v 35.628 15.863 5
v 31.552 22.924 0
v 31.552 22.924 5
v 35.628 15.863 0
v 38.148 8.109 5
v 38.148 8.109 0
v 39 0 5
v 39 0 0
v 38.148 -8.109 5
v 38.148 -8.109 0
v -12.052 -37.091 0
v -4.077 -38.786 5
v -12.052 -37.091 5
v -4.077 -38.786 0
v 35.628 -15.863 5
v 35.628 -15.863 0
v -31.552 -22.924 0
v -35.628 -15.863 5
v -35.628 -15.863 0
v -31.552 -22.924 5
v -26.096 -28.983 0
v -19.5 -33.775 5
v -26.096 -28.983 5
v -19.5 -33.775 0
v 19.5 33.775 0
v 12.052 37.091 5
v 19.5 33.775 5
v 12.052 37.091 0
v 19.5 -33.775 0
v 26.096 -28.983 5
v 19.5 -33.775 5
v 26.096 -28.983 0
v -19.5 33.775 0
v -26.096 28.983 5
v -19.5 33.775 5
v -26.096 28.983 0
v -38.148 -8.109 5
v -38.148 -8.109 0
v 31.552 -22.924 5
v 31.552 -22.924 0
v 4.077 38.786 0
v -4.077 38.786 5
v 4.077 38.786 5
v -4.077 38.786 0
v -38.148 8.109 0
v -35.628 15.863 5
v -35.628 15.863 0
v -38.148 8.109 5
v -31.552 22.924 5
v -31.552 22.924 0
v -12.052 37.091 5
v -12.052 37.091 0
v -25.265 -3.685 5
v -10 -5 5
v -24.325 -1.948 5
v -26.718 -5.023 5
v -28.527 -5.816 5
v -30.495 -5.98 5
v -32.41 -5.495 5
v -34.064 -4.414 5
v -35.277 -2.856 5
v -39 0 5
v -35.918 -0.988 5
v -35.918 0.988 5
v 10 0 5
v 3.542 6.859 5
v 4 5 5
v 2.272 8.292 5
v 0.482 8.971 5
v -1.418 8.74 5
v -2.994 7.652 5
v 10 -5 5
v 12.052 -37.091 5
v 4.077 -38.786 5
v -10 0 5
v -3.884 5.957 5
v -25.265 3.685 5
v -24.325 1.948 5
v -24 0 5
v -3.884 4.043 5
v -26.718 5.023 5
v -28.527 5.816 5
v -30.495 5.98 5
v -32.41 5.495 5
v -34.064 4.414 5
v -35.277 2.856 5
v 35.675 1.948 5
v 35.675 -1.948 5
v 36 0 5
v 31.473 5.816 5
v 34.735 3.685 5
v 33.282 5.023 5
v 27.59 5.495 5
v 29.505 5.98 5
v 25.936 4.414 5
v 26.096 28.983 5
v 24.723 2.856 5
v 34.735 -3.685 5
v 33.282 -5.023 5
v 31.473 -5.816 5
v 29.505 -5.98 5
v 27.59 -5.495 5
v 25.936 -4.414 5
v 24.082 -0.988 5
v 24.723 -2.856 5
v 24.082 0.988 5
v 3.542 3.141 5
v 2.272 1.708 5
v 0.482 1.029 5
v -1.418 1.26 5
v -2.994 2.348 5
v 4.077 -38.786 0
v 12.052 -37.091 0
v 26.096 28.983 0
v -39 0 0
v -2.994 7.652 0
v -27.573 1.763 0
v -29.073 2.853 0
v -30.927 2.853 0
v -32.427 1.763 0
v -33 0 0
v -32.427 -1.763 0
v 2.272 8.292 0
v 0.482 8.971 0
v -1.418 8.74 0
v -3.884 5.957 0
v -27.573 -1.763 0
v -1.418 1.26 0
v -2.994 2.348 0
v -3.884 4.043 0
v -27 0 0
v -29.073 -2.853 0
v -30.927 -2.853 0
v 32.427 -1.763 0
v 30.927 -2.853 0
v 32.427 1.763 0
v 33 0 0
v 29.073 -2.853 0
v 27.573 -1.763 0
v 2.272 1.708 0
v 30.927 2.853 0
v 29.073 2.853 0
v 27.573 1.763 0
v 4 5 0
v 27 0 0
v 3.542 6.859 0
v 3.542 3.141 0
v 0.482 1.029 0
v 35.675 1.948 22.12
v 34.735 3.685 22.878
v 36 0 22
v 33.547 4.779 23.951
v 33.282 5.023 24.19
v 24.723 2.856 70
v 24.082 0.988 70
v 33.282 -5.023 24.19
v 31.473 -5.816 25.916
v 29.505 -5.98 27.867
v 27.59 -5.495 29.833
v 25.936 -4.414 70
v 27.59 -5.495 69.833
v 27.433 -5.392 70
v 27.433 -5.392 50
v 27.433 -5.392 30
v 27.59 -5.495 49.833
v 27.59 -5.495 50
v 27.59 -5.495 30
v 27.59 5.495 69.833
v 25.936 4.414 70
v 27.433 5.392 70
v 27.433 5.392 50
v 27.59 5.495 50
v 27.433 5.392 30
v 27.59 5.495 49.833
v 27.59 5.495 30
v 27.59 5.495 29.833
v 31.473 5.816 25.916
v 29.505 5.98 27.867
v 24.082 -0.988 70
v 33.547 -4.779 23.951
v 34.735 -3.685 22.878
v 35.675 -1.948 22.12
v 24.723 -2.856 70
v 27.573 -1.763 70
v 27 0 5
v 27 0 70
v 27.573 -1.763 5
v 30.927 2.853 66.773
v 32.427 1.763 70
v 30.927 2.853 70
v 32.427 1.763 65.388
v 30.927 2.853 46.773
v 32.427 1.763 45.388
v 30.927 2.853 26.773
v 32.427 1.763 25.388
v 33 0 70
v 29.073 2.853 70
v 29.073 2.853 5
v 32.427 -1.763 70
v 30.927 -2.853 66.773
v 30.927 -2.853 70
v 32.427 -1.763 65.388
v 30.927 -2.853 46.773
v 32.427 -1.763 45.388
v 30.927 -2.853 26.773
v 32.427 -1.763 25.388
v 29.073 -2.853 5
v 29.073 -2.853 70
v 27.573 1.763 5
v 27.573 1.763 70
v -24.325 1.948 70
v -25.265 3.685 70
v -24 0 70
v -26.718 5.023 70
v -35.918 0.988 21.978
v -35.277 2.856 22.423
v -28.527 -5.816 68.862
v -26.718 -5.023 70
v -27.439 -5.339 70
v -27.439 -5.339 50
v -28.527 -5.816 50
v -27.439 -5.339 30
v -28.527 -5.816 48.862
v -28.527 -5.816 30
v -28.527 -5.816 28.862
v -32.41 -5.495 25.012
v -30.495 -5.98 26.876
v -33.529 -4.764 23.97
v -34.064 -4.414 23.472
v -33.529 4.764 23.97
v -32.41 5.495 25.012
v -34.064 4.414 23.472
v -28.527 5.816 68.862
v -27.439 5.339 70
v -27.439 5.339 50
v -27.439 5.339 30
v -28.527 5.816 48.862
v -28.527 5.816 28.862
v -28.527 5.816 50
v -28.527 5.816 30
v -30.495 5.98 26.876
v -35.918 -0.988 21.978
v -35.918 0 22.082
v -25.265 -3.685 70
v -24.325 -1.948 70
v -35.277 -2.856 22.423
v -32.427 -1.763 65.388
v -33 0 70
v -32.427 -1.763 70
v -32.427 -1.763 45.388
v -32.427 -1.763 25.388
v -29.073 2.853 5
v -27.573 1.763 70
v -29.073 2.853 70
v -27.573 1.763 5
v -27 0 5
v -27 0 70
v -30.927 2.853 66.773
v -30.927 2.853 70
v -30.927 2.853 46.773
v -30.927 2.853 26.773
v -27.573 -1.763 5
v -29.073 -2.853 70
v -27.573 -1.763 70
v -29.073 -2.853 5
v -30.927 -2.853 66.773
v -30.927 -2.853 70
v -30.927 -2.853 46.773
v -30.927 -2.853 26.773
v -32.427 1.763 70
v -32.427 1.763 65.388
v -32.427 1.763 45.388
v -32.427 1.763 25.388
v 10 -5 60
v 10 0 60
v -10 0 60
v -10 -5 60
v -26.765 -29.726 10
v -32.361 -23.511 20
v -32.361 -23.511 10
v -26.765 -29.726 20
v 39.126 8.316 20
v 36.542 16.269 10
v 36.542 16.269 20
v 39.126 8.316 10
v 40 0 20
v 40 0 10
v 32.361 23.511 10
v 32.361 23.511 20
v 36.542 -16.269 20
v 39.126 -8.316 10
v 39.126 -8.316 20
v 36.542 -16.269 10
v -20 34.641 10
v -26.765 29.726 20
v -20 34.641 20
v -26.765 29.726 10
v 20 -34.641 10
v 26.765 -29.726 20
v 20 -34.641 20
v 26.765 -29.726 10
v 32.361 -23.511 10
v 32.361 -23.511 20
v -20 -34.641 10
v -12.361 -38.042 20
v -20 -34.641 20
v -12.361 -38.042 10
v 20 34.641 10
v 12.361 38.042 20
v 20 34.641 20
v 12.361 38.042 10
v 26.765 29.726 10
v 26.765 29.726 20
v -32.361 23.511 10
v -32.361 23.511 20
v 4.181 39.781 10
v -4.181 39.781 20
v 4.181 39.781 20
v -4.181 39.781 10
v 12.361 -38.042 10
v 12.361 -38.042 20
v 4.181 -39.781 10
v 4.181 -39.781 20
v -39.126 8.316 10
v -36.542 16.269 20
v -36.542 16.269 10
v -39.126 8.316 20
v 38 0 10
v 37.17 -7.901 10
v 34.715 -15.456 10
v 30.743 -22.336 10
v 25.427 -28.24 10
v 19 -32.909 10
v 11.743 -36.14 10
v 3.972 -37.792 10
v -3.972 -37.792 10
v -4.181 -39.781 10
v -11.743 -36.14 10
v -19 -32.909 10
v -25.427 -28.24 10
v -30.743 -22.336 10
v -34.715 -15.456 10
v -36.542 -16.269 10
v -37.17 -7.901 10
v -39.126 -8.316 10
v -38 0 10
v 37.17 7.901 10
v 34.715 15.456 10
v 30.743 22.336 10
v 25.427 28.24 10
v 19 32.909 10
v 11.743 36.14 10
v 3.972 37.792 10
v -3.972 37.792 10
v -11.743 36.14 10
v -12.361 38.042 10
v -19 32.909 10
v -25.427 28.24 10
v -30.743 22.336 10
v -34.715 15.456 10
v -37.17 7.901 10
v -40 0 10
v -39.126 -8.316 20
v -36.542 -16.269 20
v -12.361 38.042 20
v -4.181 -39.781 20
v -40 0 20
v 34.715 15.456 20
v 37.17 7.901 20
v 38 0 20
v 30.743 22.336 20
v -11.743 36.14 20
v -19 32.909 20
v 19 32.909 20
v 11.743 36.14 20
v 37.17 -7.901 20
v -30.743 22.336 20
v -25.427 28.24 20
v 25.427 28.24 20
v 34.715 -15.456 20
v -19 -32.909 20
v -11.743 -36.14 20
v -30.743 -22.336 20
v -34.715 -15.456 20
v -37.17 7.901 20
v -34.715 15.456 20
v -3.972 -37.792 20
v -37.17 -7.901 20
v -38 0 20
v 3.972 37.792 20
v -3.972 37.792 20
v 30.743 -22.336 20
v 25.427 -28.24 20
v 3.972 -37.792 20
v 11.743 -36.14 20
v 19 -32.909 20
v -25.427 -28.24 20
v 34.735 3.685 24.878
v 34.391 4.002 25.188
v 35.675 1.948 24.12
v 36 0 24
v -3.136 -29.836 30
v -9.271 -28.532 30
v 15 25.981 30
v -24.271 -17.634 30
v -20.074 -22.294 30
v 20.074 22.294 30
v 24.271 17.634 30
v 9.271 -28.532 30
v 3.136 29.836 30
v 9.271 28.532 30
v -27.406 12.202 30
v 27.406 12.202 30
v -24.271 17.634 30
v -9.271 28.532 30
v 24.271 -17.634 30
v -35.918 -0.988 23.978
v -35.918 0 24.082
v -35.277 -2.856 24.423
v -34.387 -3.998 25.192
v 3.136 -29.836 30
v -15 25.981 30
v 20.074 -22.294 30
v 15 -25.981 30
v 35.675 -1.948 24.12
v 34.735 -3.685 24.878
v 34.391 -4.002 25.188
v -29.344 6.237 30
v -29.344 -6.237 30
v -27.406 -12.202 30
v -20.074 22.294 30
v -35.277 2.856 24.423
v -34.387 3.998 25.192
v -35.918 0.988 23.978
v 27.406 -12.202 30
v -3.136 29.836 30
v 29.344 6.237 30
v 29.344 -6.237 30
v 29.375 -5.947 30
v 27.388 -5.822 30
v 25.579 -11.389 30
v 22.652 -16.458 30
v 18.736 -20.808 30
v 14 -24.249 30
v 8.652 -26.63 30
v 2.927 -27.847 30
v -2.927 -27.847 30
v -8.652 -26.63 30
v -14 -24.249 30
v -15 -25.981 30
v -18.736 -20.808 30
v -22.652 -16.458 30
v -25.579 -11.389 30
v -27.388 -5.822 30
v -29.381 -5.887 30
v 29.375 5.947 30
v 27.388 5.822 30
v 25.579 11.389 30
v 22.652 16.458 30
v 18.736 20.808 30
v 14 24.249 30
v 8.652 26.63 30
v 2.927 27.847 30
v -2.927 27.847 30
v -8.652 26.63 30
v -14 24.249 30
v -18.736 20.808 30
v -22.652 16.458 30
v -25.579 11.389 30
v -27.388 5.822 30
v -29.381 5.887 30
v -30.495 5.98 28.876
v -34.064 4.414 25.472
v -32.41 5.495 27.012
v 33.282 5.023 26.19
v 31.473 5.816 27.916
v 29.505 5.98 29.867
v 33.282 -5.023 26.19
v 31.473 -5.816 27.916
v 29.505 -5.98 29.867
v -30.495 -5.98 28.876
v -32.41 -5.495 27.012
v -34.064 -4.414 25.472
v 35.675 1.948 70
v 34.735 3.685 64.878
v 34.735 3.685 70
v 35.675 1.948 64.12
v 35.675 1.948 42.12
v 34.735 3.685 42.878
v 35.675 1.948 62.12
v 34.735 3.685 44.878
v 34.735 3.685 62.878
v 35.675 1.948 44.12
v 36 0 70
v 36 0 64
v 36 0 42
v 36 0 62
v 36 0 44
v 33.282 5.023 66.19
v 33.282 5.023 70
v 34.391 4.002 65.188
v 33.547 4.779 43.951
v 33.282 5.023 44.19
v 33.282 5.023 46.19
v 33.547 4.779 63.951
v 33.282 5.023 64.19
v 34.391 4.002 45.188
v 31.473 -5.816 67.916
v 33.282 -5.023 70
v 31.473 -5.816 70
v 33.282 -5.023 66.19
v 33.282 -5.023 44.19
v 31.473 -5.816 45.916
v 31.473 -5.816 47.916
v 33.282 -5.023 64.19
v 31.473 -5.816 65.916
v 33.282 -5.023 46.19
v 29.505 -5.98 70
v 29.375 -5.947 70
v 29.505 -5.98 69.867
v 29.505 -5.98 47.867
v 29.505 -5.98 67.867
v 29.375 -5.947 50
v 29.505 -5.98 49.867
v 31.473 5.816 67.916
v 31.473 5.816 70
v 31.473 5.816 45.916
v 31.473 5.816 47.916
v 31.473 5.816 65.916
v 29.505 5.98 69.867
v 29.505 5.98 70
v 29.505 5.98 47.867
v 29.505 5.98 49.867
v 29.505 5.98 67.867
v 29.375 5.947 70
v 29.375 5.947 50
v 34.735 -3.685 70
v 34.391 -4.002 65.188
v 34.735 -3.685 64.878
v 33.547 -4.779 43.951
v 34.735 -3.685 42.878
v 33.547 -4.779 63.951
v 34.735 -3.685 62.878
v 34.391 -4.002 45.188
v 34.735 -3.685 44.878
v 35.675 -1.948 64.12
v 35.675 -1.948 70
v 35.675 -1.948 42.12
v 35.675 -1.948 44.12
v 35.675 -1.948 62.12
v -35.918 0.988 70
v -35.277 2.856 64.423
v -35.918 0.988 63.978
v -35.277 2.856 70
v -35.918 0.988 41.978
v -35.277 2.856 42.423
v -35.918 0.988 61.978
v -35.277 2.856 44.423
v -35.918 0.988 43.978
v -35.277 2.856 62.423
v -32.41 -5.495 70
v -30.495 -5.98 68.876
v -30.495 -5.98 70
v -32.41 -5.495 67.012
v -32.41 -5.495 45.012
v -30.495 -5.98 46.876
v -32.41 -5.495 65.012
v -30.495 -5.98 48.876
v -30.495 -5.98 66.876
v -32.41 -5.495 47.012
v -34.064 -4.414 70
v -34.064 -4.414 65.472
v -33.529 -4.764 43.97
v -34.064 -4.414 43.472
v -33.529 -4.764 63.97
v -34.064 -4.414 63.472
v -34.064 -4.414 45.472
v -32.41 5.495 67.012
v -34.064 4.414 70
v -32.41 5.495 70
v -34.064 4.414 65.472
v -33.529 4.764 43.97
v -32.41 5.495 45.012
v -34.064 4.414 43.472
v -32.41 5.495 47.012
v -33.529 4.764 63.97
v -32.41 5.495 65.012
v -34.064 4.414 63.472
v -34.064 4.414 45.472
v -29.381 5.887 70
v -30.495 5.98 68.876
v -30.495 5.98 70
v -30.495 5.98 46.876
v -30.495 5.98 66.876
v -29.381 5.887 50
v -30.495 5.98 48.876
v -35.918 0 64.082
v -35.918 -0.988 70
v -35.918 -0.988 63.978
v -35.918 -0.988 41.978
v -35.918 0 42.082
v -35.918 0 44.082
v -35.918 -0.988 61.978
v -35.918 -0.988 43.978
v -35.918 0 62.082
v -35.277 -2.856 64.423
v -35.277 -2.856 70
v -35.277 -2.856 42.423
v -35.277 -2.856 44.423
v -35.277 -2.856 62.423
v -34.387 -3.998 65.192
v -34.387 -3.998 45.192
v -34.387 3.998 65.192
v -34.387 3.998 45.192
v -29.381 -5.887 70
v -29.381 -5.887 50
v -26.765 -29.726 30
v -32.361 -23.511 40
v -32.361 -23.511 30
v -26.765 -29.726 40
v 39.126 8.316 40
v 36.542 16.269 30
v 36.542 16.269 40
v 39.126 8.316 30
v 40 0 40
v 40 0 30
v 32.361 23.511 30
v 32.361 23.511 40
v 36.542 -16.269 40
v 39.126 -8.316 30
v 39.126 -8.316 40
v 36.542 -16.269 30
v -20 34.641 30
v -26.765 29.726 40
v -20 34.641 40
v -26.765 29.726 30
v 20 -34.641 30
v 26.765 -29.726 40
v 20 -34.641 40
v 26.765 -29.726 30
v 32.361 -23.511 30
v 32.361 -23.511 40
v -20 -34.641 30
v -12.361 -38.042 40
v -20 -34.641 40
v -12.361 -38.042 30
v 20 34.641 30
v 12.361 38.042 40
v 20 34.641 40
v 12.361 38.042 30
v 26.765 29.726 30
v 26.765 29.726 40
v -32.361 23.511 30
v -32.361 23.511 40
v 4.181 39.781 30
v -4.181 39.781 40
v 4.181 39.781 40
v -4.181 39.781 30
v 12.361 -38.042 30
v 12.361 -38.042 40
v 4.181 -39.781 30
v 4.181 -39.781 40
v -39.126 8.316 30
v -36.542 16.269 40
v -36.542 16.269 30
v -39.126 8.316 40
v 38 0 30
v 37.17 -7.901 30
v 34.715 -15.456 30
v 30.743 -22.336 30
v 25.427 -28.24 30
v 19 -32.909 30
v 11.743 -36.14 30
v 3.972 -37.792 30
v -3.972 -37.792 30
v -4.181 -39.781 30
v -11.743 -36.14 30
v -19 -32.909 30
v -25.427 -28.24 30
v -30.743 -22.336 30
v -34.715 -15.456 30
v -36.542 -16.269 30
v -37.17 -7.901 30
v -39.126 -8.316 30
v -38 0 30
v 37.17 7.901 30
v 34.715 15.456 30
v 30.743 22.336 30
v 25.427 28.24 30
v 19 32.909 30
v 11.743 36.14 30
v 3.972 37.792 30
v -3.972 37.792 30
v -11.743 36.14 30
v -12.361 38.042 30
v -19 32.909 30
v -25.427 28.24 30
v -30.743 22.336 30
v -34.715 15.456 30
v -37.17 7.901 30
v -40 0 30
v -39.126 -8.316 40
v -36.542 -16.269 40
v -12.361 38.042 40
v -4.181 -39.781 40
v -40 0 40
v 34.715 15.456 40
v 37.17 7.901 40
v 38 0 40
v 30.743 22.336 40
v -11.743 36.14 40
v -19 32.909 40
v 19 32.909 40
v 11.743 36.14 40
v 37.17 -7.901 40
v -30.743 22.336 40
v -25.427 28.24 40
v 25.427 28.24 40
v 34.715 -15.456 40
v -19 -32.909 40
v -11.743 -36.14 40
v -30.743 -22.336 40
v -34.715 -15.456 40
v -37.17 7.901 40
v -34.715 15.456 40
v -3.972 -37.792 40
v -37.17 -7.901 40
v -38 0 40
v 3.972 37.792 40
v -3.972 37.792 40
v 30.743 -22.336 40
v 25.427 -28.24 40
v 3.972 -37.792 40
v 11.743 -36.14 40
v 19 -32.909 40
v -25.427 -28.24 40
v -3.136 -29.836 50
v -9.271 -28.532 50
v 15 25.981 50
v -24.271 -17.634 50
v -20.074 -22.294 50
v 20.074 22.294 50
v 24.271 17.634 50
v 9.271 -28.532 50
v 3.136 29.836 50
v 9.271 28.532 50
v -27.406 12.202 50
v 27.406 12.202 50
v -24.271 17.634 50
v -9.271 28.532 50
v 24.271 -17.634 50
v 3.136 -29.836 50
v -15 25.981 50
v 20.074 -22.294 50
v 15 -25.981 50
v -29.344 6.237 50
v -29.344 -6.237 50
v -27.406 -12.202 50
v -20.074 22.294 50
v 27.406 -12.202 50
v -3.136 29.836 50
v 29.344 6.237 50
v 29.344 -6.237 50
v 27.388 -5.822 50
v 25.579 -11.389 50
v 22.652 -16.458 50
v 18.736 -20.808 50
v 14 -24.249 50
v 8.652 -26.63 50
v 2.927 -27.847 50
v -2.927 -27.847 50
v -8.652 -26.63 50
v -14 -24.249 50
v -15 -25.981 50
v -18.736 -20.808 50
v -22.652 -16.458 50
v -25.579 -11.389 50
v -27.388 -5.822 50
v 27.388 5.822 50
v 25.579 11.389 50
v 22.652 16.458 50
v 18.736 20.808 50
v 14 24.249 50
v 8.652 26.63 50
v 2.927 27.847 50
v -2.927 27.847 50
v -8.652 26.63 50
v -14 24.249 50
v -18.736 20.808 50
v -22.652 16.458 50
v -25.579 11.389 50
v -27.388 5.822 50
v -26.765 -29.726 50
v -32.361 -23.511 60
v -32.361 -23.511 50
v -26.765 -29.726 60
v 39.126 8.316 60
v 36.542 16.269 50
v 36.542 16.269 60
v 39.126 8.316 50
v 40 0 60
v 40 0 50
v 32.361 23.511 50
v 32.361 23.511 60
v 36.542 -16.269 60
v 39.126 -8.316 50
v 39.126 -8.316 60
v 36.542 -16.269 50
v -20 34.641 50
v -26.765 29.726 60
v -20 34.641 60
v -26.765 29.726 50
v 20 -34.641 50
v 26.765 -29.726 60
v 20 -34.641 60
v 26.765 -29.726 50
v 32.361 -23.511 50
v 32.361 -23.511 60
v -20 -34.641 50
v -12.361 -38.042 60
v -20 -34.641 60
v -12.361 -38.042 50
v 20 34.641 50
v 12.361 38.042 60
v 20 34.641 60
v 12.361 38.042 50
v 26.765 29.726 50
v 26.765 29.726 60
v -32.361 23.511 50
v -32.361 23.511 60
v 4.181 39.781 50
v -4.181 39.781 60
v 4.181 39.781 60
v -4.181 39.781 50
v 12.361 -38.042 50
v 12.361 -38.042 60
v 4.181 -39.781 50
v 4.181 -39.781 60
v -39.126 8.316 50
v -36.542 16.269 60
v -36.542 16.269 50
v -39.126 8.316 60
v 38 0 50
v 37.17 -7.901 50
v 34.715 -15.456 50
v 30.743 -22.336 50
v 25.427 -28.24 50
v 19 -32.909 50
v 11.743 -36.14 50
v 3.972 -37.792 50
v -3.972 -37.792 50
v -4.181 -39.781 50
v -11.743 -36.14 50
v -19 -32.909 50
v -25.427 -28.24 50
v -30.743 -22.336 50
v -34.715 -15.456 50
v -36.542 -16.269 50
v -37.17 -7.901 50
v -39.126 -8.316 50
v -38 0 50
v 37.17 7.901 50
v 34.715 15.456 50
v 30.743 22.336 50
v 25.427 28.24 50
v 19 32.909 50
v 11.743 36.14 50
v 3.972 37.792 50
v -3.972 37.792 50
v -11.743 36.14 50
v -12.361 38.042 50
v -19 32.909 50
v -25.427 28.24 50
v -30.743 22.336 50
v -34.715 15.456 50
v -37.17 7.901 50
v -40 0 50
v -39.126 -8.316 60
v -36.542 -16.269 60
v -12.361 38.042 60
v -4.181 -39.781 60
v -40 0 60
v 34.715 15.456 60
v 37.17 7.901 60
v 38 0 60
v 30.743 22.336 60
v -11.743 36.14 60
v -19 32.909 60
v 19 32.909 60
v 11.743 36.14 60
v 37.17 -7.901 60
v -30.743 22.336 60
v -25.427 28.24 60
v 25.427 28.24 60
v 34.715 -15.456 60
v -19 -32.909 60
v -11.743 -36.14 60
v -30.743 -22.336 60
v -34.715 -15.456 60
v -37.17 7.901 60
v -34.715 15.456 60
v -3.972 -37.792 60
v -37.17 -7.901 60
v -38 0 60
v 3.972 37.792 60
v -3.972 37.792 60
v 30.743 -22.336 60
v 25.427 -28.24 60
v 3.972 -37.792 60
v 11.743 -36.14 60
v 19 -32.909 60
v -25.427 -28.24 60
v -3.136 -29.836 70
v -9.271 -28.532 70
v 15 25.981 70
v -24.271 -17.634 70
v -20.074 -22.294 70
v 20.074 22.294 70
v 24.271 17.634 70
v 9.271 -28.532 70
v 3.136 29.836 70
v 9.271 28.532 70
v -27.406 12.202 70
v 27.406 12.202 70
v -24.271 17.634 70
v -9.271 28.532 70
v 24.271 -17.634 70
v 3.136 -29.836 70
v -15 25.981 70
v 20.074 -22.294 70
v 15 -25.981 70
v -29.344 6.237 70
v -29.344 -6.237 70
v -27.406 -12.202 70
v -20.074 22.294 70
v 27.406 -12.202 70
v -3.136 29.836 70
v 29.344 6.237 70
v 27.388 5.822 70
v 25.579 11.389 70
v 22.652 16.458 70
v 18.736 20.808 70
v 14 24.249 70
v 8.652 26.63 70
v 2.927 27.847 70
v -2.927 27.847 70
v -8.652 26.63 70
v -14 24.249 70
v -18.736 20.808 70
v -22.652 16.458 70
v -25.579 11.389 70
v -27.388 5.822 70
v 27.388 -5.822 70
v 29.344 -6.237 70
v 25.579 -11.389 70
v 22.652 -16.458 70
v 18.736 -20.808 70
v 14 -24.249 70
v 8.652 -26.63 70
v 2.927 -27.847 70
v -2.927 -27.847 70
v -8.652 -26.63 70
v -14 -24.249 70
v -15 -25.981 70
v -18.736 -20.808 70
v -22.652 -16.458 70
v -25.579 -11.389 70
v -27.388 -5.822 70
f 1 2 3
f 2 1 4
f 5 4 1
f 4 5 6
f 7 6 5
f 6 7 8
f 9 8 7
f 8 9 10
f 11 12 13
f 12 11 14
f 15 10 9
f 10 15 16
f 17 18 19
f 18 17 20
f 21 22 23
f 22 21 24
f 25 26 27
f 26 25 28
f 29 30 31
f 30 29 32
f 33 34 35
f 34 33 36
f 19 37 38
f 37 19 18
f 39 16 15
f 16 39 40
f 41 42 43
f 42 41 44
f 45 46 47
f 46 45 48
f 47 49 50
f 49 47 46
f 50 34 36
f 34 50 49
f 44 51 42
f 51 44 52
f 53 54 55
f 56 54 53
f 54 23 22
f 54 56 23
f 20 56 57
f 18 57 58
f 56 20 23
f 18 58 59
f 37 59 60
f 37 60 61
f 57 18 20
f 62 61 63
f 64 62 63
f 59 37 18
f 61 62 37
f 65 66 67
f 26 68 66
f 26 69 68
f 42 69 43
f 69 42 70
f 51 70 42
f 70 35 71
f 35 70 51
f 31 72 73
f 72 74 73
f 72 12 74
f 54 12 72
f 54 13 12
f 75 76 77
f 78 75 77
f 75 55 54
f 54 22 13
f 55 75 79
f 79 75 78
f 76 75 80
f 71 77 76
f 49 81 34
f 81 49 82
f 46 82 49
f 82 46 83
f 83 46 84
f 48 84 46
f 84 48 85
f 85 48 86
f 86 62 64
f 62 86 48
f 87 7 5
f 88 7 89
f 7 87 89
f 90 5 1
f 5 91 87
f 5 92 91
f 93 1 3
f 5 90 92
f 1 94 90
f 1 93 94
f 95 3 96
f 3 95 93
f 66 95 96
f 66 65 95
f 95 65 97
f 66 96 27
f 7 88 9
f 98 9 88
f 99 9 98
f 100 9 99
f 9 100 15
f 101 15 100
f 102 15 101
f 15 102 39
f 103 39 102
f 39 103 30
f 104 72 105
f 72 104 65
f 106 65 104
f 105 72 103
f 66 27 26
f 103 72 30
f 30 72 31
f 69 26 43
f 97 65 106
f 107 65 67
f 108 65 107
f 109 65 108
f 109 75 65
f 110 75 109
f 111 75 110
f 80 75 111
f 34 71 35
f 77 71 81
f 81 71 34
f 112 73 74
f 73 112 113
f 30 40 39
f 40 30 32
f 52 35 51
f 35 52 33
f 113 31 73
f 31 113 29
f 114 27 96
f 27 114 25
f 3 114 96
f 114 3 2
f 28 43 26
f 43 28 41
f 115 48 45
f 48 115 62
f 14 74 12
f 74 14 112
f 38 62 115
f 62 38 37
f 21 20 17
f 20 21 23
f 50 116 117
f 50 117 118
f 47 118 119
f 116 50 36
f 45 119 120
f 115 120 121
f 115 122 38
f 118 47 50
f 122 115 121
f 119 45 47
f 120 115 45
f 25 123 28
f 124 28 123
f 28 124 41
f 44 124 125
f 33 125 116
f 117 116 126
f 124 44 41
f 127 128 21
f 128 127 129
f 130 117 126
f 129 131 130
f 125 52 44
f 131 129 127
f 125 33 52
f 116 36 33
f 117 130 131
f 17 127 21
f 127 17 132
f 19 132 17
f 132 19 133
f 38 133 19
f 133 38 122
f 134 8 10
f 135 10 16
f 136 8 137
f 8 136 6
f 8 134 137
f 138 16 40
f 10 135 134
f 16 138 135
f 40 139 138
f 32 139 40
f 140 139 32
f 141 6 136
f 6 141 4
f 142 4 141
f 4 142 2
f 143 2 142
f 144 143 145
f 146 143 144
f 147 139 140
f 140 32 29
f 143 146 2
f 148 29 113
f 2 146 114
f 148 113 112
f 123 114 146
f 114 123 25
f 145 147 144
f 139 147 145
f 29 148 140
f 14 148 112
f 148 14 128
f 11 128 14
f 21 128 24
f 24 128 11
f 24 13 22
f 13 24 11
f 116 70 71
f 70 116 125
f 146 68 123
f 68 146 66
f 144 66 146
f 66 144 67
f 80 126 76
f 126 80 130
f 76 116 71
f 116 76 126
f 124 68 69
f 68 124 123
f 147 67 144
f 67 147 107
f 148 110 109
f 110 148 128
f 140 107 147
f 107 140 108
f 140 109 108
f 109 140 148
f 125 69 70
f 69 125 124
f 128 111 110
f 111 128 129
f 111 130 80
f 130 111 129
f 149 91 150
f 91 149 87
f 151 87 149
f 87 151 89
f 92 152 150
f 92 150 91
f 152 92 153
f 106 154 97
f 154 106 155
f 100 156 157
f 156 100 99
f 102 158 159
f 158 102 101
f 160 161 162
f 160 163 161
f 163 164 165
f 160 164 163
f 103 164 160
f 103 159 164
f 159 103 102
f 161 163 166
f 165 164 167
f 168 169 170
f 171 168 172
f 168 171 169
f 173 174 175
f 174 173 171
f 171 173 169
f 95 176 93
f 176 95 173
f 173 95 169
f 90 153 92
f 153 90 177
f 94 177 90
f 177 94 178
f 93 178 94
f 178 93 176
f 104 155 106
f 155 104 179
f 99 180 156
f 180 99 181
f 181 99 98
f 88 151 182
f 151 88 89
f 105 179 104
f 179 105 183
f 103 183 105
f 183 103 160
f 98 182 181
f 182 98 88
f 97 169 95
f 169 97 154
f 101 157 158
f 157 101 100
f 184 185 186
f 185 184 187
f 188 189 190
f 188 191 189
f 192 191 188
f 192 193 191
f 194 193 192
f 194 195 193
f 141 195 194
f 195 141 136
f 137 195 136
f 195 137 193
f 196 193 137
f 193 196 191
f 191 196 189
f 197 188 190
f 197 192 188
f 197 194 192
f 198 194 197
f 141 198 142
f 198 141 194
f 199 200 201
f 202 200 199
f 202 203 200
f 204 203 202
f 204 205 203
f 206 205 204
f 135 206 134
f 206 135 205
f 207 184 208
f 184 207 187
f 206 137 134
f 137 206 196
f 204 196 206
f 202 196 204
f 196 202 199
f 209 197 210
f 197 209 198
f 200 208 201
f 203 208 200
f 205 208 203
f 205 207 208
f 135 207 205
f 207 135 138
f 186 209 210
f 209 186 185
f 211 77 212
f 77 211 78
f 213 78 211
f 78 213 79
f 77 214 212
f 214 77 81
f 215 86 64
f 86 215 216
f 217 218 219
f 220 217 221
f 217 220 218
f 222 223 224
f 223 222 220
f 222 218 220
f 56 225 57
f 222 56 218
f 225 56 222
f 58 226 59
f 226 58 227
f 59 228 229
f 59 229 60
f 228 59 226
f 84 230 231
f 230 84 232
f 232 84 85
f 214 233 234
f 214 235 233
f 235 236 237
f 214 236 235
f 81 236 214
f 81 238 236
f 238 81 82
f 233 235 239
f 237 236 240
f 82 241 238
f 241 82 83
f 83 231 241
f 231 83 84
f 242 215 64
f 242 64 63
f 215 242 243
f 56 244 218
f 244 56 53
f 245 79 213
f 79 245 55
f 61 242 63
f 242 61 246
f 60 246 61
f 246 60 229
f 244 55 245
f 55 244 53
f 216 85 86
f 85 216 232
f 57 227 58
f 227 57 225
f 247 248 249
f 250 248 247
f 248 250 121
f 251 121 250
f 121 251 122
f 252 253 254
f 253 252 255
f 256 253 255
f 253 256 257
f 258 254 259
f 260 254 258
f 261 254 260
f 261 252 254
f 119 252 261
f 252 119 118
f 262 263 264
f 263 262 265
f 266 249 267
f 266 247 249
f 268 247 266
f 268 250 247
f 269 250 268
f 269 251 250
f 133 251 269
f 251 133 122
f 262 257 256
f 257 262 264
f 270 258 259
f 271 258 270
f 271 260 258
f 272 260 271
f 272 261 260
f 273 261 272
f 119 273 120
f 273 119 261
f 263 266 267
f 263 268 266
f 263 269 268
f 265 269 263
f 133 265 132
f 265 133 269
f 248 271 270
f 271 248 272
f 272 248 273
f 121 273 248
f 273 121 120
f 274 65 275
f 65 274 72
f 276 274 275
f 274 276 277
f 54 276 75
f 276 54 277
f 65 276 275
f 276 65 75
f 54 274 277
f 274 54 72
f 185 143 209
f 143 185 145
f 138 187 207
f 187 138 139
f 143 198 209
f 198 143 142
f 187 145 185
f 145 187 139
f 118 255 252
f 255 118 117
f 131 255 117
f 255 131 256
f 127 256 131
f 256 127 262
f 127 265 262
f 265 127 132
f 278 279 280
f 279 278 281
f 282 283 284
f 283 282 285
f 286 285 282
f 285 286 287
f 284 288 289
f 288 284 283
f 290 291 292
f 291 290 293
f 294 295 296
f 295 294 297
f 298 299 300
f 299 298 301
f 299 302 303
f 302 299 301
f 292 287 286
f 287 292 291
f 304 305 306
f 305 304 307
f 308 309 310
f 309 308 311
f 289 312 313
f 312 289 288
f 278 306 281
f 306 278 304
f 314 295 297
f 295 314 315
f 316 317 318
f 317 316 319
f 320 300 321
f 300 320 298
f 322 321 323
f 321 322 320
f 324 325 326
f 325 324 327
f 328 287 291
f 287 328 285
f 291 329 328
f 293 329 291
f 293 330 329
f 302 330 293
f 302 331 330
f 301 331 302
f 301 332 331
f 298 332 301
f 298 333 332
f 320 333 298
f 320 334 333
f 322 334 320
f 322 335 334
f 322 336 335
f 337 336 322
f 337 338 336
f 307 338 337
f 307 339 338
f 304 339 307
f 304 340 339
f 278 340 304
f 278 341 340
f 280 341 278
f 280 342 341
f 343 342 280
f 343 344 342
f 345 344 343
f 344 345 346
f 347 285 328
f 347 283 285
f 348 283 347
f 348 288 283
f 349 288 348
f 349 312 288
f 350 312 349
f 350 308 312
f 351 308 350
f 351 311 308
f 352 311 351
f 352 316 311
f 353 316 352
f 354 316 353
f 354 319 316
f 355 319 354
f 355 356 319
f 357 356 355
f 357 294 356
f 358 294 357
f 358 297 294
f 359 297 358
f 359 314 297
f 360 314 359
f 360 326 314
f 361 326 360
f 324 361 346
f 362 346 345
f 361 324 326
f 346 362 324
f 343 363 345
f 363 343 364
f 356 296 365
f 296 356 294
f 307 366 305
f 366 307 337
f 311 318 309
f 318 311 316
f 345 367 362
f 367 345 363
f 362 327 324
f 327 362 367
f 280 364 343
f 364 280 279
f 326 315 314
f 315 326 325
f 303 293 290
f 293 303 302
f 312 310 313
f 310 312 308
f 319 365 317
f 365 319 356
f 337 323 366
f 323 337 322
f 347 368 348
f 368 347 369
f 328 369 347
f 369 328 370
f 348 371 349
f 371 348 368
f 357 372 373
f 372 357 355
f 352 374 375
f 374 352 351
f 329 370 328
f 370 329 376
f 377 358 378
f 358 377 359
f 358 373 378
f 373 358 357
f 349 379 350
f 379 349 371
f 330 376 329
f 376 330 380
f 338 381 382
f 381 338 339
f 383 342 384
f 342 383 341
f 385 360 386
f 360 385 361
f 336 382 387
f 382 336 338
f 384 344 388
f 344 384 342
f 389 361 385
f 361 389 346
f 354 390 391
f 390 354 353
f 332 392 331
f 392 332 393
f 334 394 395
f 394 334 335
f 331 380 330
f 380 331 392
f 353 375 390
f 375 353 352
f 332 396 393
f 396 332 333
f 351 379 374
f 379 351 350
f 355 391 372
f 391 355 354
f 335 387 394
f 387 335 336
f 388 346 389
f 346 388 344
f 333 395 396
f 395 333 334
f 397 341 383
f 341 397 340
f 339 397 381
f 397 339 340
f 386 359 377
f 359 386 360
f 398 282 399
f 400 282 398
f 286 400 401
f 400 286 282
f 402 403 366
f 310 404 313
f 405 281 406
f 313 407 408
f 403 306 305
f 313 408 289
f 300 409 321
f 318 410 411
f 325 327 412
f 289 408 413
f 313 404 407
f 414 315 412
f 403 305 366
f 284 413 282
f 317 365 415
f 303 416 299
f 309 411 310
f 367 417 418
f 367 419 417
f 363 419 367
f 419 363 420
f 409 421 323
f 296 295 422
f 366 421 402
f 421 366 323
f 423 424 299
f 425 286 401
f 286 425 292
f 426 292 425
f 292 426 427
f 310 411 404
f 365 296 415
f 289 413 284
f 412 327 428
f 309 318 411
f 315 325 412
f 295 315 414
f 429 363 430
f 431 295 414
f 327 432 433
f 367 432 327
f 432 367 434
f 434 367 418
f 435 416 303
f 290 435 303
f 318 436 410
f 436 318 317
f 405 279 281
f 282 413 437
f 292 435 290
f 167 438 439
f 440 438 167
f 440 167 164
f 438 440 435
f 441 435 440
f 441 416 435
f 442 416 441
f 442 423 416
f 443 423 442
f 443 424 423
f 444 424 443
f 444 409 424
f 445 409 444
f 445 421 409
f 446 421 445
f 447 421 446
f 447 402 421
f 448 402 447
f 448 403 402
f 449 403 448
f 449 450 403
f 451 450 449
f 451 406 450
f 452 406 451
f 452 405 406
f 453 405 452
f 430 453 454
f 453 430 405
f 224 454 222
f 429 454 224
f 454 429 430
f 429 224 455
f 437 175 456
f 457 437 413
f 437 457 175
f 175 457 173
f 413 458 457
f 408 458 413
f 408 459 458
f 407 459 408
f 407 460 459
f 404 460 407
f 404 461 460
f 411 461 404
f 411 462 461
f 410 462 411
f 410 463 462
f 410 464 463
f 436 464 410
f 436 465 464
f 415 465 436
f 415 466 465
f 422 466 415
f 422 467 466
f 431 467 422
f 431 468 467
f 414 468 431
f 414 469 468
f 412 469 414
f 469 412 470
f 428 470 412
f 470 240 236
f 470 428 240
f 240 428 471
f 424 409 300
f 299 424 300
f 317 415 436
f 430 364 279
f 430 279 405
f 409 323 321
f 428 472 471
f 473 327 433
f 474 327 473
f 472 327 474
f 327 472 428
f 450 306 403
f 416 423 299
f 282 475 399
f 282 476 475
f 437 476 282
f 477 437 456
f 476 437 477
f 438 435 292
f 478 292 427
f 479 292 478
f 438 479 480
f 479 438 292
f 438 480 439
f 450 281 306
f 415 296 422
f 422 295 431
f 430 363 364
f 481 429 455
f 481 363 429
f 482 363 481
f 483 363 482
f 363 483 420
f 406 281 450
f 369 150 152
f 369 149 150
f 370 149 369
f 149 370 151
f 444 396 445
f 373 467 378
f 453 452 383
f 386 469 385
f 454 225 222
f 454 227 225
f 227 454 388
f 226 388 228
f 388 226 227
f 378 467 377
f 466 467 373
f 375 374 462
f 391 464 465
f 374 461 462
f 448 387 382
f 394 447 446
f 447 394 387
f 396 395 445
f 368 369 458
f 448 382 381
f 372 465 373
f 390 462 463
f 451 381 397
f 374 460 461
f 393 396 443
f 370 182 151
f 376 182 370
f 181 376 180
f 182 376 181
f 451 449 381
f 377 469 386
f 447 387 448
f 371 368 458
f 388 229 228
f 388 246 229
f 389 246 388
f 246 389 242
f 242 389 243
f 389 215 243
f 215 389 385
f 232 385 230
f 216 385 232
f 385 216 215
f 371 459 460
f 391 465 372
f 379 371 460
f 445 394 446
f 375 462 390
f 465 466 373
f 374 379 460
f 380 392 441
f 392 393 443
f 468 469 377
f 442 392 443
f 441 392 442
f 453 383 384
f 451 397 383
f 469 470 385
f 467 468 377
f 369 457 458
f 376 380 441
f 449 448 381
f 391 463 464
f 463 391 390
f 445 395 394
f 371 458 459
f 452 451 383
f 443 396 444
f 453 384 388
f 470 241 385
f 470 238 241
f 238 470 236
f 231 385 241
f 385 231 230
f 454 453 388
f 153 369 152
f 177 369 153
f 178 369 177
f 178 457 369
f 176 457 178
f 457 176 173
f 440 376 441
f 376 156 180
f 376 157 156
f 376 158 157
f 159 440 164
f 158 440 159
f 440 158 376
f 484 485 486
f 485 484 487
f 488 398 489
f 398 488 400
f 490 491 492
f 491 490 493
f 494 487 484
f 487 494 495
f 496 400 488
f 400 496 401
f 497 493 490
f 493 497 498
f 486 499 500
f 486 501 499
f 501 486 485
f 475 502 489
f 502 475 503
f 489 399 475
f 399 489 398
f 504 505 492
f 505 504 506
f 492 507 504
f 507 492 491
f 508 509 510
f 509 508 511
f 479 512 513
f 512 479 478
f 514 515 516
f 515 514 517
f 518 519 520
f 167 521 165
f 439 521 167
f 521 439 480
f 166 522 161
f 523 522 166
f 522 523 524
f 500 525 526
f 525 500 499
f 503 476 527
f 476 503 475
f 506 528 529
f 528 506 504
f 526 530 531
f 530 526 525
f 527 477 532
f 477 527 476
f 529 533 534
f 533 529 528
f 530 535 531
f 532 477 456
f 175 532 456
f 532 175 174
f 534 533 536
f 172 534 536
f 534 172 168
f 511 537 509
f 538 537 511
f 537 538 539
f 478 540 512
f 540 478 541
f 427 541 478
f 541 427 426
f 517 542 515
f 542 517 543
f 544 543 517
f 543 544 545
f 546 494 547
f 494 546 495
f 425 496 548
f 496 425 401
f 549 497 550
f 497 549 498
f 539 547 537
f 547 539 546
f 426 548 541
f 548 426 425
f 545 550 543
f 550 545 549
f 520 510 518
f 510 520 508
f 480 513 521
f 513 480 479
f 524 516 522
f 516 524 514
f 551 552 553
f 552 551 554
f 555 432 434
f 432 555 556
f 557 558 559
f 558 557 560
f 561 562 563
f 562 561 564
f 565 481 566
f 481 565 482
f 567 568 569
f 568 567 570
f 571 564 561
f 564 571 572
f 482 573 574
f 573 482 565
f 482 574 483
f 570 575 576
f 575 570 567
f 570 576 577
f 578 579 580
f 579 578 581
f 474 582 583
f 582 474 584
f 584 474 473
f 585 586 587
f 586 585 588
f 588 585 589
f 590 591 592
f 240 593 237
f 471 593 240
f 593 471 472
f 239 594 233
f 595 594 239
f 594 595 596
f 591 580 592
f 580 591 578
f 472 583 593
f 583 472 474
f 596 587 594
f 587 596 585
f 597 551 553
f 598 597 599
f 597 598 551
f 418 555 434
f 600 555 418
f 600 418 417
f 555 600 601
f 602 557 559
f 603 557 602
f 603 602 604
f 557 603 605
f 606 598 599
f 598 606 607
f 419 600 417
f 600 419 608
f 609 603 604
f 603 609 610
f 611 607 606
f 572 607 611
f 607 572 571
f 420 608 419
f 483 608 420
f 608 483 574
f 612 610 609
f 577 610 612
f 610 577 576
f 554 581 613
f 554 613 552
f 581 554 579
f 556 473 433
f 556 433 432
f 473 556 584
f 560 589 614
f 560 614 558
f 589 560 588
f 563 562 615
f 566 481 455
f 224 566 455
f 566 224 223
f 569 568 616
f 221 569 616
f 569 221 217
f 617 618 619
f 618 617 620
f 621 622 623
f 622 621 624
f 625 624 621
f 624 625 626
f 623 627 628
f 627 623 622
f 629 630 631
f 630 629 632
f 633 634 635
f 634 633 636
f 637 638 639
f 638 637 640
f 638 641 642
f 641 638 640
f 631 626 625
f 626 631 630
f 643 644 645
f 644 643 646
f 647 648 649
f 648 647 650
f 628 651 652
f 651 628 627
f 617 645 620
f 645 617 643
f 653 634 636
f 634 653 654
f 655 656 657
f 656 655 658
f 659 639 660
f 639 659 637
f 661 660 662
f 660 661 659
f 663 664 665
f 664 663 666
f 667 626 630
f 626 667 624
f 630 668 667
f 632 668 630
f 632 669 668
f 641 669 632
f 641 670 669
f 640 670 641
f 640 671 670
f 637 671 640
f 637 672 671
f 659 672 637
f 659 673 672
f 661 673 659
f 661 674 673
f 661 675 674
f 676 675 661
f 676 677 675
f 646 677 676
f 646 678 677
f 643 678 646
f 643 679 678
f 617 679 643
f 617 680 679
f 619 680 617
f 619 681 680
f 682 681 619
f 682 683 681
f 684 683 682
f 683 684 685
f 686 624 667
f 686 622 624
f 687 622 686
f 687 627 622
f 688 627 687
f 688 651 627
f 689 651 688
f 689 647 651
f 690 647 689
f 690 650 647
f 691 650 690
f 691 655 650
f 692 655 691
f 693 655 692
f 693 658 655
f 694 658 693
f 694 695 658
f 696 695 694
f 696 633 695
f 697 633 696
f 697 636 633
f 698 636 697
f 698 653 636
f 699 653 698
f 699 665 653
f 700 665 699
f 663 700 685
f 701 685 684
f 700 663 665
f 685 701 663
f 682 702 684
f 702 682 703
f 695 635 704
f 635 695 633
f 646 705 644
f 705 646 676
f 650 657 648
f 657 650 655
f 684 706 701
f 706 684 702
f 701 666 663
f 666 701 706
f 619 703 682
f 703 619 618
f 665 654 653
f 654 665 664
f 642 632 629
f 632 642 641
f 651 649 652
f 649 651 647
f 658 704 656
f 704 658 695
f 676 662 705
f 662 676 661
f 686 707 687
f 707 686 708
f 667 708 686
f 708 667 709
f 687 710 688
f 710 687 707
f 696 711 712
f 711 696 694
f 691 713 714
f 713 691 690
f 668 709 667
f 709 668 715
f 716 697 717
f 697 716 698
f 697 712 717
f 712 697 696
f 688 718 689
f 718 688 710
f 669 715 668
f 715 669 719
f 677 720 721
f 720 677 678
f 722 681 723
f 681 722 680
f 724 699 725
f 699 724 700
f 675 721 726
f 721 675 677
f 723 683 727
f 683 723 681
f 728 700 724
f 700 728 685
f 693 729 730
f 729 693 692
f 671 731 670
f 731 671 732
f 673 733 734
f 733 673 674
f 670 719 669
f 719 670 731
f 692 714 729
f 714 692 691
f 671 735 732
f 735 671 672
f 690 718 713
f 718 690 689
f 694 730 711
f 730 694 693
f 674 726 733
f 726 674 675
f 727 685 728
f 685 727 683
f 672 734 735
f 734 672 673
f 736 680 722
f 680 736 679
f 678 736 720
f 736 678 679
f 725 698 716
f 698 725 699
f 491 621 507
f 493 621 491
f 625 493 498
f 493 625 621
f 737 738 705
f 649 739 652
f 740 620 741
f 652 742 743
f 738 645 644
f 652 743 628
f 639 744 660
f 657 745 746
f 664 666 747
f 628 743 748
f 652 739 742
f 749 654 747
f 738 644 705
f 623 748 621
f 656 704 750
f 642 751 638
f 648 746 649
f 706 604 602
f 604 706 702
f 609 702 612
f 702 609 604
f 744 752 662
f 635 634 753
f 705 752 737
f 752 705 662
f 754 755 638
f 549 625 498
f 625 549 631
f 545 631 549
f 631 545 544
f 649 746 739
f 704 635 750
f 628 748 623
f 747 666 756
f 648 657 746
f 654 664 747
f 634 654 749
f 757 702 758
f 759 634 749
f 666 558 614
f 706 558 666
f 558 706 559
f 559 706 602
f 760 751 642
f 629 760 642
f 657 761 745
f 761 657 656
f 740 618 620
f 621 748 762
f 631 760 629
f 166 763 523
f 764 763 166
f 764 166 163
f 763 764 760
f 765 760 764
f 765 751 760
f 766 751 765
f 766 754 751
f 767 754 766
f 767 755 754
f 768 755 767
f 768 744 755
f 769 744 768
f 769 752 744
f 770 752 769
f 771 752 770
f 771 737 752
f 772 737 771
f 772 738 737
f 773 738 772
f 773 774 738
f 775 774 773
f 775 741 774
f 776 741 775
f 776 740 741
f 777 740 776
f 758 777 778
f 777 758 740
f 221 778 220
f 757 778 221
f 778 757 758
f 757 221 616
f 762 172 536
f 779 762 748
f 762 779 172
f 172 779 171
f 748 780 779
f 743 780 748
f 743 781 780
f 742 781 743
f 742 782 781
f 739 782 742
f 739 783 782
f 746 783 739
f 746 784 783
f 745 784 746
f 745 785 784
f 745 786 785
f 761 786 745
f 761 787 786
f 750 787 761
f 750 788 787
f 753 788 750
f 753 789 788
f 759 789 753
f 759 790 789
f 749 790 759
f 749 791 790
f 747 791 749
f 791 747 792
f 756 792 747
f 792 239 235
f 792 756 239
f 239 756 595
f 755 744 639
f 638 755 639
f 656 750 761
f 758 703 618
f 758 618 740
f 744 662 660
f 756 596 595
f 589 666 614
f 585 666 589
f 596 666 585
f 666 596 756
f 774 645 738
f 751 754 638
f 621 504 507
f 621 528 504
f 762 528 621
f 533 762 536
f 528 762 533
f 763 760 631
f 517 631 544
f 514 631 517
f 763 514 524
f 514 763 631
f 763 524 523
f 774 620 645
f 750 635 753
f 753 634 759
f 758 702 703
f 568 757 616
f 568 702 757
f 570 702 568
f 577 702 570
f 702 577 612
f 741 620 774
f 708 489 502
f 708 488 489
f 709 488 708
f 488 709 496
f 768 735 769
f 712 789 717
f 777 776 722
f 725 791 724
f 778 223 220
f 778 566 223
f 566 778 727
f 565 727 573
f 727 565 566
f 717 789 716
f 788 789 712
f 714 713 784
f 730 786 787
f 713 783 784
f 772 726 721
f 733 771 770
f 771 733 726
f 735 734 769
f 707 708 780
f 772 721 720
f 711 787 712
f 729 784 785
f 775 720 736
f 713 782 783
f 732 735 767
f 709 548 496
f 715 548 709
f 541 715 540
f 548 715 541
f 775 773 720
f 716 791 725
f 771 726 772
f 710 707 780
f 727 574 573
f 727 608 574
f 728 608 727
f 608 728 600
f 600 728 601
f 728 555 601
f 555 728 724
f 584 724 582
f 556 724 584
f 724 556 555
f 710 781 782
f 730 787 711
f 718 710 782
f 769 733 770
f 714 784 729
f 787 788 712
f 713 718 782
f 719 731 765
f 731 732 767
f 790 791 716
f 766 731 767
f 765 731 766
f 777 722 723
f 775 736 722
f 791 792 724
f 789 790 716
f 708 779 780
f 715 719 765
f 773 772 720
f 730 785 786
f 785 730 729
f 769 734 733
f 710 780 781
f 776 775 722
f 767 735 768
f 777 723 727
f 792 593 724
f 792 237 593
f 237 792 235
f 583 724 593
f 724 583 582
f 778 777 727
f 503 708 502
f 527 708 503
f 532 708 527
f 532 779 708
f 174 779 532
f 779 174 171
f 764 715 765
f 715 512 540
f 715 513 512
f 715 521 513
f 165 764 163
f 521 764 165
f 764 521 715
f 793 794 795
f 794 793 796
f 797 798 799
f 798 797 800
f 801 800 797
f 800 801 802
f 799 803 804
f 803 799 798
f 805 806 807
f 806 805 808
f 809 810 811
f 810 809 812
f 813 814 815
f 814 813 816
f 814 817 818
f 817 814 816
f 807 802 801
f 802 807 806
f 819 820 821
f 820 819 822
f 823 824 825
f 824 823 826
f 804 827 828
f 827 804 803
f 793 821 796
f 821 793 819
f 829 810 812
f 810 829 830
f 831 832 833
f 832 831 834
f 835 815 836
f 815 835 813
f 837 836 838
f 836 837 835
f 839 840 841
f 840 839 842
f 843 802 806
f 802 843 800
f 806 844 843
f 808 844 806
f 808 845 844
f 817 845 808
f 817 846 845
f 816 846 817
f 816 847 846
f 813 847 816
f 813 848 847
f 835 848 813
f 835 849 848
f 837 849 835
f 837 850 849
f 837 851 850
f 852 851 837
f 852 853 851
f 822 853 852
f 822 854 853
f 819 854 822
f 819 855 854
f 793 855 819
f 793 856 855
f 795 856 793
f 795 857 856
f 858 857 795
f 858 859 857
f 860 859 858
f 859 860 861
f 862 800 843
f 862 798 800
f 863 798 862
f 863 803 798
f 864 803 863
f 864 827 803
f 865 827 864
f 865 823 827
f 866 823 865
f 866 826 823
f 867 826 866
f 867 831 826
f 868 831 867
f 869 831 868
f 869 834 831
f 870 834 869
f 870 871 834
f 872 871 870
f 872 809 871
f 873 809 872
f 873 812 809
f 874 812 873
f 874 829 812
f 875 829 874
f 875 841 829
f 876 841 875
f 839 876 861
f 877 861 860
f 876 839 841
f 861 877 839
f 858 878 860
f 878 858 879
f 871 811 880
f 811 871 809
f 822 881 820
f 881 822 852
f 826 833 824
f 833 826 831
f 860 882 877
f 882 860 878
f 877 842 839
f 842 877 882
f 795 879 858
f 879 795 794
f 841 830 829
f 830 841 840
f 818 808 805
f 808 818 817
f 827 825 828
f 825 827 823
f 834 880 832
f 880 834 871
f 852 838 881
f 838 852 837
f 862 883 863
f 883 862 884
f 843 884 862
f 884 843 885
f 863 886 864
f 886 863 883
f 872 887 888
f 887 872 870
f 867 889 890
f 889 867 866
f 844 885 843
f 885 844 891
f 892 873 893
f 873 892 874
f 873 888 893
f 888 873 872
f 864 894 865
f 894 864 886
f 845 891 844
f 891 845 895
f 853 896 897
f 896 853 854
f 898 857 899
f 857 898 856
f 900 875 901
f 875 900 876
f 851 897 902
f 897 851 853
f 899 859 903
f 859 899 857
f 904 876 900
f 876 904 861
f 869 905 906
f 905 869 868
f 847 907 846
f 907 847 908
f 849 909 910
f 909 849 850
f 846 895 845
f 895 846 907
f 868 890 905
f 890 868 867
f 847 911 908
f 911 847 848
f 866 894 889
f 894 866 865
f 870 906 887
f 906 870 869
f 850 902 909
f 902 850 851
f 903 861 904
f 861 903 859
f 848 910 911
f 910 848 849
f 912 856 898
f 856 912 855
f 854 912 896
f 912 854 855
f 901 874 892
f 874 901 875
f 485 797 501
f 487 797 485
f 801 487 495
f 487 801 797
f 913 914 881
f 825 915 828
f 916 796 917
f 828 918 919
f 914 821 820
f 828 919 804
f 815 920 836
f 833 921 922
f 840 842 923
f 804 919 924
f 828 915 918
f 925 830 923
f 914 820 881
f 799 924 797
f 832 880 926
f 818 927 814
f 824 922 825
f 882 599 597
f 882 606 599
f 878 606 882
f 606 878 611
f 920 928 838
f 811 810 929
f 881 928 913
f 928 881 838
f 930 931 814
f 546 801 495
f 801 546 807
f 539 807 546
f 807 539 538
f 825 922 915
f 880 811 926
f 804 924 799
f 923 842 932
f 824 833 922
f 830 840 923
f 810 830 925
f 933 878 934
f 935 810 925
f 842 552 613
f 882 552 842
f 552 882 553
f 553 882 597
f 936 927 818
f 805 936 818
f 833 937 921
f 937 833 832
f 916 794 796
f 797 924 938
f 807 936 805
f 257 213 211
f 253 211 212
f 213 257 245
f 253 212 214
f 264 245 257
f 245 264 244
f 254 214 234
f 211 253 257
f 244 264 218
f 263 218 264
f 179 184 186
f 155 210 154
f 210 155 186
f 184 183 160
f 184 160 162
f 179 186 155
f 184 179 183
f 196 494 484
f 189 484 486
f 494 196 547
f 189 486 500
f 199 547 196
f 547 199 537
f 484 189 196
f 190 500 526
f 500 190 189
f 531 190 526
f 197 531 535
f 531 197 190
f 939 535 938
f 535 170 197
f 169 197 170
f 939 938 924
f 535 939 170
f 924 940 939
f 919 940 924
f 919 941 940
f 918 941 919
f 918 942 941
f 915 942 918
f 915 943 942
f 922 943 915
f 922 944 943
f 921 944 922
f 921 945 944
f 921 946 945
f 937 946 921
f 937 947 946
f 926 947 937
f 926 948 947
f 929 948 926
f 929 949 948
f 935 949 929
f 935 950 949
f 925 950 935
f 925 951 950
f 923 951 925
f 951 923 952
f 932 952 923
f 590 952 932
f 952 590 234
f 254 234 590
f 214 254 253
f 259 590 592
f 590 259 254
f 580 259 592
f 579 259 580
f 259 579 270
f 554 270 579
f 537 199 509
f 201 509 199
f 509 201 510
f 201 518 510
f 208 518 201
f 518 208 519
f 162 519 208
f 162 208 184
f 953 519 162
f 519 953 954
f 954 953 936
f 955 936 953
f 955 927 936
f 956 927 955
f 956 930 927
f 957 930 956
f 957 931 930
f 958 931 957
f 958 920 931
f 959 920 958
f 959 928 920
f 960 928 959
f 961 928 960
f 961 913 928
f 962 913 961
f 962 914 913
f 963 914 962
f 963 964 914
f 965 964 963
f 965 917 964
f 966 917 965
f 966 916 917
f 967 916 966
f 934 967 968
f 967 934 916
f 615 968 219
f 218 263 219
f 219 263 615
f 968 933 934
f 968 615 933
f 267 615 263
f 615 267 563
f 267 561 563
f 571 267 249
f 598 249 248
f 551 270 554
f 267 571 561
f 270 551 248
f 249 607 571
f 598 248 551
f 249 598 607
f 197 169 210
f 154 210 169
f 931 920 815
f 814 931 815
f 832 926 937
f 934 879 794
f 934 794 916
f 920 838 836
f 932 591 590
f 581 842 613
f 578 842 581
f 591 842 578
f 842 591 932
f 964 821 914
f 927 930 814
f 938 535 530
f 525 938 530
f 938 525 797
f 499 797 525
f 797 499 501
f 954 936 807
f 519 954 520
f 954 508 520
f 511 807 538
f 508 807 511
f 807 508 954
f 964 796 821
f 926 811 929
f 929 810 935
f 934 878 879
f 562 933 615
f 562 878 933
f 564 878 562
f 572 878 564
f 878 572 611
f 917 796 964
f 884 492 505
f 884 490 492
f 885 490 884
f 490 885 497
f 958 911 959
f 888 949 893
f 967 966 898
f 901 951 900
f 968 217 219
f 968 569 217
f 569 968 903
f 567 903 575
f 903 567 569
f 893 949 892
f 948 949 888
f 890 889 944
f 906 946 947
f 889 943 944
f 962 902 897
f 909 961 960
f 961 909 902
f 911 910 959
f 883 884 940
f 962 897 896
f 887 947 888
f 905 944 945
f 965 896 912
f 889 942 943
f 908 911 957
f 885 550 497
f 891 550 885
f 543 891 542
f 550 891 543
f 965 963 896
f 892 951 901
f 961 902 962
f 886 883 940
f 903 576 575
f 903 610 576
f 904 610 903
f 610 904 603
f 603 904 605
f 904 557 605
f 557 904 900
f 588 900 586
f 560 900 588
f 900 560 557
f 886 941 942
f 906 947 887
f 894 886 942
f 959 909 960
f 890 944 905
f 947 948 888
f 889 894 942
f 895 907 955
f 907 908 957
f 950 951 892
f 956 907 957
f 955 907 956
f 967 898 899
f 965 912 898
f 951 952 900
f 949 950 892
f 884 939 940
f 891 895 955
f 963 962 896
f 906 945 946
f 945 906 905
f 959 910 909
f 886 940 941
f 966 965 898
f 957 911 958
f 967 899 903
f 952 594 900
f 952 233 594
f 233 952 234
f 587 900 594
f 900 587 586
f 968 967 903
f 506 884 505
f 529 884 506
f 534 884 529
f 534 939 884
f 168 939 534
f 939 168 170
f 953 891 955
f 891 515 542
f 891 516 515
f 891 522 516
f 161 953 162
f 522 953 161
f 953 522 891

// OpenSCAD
// All units are in millimeters
width = 40; // Width of a ring
inner_width = 30; // Width of the inner/smaller part of a ring
height = 20; // Height of a single ring
stick_width = 6; // M6 = 6mm
margin = 1; // Wall thickness

count = 3; // Ring count
offset = inner_width; // Mounting hole offset
bottom_height = height/4; // Bottom plate height

module dht22() {
    color("red") cube([15,7.8,25]);
}

module bottom_plate(height) {
    difference() {
        union() {
            // Dht22 stand
            translate([-10, -5, 0]) cube([20, 5, 60]);
            
            difference() {
                cylinder(h=height,r1=width-margin,r2=width-margin);
                translate([0, 5, 0]) cylinder(h=height,r1=width/10,r2=width/10);
            }
            translate([offset, 0, height]) stick(width=stick_width, height=height);
            translate([-offset, 0, height]) stick(width=stick_width, height=height);
        }
        // Mounting holes
        translate([offset, 0, 0]) cylinder(h=height,r1=stick_width/2,r2=stick_width/2);
        translate([-offset, 0, 0]) cylinder(h=height,r1=stick_width/2,r2=stick_width/2);
    }
}

module ring(width=10, height=3, closed=false) {
    difference() {
        cylinder(h=height,r1=width,r2=width);
        cylinder(h=height,r1=width-margin*2,r2=width-margin*2);
    }
    
    translate([0, 0, height])
        difference() {
            cylinder(h=height,r1=width,r2=inner_width);
            if(!closed){
                cylinder(h=height,r1=width-margin*2,r2=inner_width-margin*2);

            }
            translate([offset, 0, 0]) cylinder(h=height,r1=stick_width/2,r2=stick_width/2);
            translate([-offset, 0, 0]) cylinder(h=height,r1=stick_width/2,r2=stick_width/2);
        }
}

module stick(height=1) {
    difference () {
        cylinder(h=height,r1=width,r2=width);
        cylinder(h=height,r1=width/2,r2=width/2);
    };
}

module cap() {
    difference() {
        cylinder(h=height*2,r1=width,r2=0);
        translate([0, 0, -height/2])
        cylinder(h=height*2,r1=width,r2=0);
    }
}

bottom_plate(height=bottom_height);
%translate([-7.5, 0, 30]) dht22();

translate([0, 0, bottom_height*2])
for(y=[0:height:count*height-1]) {
    translate([0, 0, y]) ring(width=width, height=height/2);
    translate([offset, 0, y]) stick(width=stick_width, height=height);
    translate([-offset, 0, y]) stick(width=stick_width, height=height);
}

cap_y=count*height+height/2;
%translate([0, 0, cap_y])
union() {
    ring(width=width, height=height/2, closed=true);
    translate([offset, 0, 0]) stick(width=stick_width, height=height/2);
    translate([-offset, 0, 0]) stick(width=stick_width, height=height/2);
}
